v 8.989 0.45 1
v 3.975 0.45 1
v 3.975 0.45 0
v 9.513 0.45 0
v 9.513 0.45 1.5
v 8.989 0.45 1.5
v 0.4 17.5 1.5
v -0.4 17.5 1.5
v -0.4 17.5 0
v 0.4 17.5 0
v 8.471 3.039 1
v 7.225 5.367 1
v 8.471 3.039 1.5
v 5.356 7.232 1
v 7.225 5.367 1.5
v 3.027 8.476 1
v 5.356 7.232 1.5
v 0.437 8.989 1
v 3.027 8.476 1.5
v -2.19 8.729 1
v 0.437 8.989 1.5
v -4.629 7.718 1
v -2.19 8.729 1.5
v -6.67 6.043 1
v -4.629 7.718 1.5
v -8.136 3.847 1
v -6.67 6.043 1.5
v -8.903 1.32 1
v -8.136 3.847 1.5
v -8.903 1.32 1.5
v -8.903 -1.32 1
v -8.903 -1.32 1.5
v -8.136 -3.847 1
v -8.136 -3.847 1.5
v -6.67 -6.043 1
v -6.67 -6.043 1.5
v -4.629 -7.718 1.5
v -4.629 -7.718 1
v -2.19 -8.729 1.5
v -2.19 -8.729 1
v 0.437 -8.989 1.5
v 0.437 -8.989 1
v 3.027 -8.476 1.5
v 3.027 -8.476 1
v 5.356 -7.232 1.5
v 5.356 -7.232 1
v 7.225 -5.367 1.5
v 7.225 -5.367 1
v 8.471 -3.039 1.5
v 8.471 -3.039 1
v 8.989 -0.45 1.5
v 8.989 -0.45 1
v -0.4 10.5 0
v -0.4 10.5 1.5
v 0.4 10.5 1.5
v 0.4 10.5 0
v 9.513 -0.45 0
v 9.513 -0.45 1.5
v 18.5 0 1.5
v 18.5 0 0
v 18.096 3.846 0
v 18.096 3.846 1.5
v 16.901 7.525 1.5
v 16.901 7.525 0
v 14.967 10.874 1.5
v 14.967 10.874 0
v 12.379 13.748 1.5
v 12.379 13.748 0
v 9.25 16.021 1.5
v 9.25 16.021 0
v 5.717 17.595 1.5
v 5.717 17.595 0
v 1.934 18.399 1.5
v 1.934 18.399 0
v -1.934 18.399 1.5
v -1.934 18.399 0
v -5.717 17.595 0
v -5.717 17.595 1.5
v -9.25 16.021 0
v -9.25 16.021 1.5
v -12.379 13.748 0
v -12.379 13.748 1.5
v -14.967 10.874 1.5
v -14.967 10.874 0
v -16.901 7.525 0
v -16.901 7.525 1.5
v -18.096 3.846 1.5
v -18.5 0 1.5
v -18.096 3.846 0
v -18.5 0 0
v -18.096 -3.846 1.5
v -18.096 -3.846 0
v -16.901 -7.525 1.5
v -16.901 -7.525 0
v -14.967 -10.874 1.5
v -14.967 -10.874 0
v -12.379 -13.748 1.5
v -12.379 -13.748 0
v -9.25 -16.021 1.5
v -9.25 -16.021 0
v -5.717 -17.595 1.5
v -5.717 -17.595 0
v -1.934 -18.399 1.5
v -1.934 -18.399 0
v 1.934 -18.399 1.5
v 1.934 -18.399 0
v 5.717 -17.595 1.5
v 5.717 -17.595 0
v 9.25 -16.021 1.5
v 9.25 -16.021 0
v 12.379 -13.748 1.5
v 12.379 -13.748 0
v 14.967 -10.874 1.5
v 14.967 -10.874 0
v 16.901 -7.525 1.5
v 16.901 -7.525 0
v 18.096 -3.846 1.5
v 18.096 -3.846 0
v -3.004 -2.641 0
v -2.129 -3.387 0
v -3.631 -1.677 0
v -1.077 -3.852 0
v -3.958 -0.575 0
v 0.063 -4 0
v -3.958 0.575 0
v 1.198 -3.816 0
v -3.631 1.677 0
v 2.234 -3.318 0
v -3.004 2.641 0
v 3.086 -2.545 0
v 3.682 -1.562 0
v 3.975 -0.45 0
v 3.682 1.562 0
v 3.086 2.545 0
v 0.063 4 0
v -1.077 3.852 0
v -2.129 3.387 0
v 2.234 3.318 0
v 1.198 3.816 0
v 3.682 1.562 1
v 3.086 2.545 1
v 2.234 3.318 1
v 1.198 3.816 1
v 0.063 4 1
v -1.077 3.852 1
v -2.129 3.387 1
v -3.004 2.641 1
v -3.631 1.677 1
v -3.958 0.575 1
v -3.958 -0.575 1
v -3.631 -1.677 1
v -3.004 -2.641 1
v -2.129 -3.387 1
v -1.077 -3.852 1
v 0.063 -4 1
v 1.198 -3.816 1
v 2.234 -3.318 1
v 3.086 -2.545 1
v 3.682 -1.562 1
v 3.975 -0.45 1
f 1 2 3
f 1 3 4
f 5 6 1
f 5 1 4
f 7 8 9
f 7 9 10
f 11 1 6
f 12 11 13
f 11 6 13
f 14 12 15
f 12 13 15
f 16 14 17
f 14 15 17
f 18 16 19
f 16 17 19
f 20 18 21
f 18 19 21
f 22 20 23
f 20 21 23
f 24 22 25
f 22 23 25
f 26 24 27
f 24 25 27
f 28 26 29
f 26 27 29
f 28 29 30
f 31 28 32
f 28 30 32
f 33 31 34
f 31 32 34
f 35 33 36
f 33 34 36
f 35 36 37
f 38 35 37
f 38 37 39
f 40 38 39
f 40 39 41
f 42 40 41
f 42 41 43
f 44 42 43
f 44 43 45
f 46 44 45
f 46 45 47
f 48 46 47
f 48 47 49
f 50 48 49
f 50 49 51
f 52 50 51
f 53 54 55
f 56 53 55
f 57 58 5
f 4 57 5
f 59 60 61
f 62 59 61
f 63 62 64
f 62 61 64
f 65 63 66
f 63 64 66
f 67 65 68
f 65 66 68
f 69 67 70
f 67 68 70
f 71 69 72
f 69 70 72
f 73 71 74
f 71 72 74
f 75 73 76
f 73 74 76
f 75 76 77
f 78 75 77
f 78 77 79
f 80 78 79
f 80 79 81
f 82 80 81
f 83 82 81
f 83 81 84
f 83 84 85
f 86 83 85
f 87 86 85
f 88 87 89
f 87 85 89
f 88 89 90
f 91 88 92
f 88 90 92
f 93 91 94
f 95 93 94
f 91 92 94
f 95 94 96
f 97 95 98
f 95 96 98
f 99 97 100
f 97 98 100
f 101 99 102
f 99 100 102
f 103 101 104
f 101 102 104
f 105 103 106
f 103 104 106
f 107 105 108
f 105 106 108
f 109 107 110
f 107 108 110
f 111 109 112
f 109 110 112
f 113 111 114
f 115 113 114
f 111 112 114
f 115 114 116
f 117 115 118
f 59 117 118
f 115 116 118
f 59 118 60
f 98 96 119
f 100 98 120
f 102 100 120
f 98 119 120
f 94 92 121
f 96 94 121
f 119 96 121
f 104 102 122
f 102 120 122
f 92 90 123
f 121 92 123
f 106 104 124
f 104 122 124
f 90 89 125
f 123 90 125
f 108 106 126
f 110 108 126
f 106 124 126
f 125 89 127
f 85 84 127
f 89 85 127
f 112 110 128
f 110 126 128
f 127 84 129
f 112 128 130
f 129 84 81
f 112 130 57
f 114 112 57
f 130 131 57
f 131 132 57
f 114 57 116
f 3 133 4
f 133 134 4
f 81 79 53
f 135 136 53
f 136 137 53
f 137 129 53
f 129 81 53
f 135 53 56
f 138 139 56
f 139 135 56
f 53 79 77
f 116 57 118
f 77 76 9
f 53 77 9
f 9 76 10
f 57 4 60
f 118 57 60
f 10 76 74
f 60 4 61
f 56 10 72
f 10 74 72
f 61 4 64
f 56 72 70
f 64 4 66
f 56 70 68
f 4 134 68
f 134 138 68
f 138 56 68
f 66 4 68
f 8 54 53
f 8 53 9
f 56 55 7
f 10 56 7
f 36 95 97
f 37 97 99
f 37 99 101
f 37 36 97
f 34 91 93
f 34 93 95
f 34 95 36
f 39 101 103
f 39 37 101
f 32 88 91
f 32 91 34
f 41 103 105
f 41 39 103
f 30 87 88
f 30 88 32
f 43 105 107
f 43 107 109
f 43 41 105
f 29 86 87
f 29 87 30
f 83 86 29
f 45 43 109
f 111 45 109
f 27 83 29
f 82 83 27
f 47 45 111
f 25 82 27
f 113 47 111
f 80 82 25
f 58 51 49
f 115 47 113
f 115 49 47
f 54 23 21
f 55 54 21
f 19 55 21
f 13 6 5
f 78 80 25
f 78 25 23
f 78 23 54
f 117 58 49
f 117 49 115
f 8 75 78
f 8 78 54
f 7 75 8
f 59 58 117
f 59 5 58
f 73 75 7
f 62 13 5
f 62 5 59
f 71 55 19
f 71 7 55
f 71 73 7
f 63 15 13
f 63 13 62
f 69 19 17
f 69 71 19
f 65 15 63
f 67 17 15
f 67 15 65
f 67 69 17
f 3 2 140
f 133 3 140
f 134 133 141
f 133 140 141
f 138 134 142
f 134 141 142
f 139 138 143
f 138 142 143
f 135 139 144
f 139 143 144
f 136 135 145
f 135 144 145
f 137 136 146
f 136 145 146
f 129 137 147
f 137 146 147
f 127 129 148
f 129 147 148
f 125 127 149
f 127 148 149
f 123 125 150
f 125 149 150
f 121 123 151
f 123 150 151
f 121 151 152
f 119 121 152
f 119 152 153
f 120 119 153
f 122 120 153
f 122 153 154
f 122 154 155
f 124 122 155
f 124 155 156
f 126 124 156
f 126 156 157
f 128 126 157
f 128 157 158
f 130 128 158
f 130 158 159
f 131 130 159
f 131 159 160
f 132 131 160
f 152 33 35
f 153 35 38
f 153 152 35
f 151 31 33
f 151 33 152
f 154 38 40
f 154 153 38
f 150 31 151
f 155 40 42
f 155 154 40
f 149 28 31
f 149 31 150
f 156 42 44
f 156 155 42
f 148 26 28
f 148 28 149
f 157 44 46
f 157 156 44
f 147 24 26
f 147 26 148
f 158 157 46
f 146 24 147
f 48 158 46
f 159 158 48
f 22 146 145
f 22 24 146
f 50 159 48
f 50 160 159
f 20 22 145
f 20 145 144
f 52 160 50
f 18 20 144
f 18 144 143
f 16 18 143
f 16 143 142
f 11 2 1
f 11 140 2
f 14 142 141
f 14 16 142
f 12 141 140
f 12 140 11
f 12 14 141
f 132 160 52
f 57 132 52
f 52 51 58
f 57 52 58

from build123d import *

# Parameters (mm, degrees)
SKETCH_1_R          = 18.5
EXTRUDE_1_DEPTH     = 1.5
SKETCH_2_R          = 4
CUT_EXTRUDE_1_DEPTH = 27.205915363
SKETCH_3_R          = 9
CUT_EXTRUDE_2_DEPTH = 0.5
SKETCH_4_W          = 7
SKETCH_4_H          = 0.9
CUT_EXTRUDE_3_DEPTH = 27.205915363
SKETCH_5_W          = 0.8
SKETCH_5_H          = 7
CUT_EXTRUDE_4_DEPTH = 27.205915363


with BuildPart() as part:
    # Эскиз1 → Бобышка-Вытянуть1 (new body)
    with BuildSketch(Plane.XY):
        Circle(SKETCH_1_R)
    extrude(amount=EXTRUDE_1_DEPTH)

    # Эскиз2 → Вырез-Вытянуть1 (cut, through all)
    with BuildSketch(Plane.XY.offset(1.5)):
        Circle(SKETCH_2_R)
    extrude(amount=-CUT_EXTRUDE_1_DEPTH, mode=Mode.SUBTRACT)

    # Эскиз3 → Вырез-Вытянуть2 (cut)
    with BuildSketch(Plane.XY.offset(1.5)):
        Circle(SKETCH_3_R)
    extrude(amount=-CUT_EXTRUDE_2_DEPTH, mode=Mode.SUBTRACT)

    # Эскиз4 → Вырез-Вытянуть3 (cut, through all)
    with BuildSketch(Plane.XY.offset(1.5)):
        with Locations((6.013449427, 0)):
            Rectangle(SKETCH_4_W, SKETCH_4_H)
    extrude(amount=-CUT_EXTRUDE_3_DEPTH, mode=Mode.SUBTRACT)

    # Эскиз5 → Вырез-Вытянуть4 (cut, through all)
    with BuildSketch(Plane.XY.offset(1.5)):
        with Locations((0, 14)):
            Rectangle(SKETCH_5_W, SKETCH_5_H)
    extrude(amount=-CUT_EXTRUDE_4_DEPTH, mode=Mode.SUBTRACT)


solid = part.part
